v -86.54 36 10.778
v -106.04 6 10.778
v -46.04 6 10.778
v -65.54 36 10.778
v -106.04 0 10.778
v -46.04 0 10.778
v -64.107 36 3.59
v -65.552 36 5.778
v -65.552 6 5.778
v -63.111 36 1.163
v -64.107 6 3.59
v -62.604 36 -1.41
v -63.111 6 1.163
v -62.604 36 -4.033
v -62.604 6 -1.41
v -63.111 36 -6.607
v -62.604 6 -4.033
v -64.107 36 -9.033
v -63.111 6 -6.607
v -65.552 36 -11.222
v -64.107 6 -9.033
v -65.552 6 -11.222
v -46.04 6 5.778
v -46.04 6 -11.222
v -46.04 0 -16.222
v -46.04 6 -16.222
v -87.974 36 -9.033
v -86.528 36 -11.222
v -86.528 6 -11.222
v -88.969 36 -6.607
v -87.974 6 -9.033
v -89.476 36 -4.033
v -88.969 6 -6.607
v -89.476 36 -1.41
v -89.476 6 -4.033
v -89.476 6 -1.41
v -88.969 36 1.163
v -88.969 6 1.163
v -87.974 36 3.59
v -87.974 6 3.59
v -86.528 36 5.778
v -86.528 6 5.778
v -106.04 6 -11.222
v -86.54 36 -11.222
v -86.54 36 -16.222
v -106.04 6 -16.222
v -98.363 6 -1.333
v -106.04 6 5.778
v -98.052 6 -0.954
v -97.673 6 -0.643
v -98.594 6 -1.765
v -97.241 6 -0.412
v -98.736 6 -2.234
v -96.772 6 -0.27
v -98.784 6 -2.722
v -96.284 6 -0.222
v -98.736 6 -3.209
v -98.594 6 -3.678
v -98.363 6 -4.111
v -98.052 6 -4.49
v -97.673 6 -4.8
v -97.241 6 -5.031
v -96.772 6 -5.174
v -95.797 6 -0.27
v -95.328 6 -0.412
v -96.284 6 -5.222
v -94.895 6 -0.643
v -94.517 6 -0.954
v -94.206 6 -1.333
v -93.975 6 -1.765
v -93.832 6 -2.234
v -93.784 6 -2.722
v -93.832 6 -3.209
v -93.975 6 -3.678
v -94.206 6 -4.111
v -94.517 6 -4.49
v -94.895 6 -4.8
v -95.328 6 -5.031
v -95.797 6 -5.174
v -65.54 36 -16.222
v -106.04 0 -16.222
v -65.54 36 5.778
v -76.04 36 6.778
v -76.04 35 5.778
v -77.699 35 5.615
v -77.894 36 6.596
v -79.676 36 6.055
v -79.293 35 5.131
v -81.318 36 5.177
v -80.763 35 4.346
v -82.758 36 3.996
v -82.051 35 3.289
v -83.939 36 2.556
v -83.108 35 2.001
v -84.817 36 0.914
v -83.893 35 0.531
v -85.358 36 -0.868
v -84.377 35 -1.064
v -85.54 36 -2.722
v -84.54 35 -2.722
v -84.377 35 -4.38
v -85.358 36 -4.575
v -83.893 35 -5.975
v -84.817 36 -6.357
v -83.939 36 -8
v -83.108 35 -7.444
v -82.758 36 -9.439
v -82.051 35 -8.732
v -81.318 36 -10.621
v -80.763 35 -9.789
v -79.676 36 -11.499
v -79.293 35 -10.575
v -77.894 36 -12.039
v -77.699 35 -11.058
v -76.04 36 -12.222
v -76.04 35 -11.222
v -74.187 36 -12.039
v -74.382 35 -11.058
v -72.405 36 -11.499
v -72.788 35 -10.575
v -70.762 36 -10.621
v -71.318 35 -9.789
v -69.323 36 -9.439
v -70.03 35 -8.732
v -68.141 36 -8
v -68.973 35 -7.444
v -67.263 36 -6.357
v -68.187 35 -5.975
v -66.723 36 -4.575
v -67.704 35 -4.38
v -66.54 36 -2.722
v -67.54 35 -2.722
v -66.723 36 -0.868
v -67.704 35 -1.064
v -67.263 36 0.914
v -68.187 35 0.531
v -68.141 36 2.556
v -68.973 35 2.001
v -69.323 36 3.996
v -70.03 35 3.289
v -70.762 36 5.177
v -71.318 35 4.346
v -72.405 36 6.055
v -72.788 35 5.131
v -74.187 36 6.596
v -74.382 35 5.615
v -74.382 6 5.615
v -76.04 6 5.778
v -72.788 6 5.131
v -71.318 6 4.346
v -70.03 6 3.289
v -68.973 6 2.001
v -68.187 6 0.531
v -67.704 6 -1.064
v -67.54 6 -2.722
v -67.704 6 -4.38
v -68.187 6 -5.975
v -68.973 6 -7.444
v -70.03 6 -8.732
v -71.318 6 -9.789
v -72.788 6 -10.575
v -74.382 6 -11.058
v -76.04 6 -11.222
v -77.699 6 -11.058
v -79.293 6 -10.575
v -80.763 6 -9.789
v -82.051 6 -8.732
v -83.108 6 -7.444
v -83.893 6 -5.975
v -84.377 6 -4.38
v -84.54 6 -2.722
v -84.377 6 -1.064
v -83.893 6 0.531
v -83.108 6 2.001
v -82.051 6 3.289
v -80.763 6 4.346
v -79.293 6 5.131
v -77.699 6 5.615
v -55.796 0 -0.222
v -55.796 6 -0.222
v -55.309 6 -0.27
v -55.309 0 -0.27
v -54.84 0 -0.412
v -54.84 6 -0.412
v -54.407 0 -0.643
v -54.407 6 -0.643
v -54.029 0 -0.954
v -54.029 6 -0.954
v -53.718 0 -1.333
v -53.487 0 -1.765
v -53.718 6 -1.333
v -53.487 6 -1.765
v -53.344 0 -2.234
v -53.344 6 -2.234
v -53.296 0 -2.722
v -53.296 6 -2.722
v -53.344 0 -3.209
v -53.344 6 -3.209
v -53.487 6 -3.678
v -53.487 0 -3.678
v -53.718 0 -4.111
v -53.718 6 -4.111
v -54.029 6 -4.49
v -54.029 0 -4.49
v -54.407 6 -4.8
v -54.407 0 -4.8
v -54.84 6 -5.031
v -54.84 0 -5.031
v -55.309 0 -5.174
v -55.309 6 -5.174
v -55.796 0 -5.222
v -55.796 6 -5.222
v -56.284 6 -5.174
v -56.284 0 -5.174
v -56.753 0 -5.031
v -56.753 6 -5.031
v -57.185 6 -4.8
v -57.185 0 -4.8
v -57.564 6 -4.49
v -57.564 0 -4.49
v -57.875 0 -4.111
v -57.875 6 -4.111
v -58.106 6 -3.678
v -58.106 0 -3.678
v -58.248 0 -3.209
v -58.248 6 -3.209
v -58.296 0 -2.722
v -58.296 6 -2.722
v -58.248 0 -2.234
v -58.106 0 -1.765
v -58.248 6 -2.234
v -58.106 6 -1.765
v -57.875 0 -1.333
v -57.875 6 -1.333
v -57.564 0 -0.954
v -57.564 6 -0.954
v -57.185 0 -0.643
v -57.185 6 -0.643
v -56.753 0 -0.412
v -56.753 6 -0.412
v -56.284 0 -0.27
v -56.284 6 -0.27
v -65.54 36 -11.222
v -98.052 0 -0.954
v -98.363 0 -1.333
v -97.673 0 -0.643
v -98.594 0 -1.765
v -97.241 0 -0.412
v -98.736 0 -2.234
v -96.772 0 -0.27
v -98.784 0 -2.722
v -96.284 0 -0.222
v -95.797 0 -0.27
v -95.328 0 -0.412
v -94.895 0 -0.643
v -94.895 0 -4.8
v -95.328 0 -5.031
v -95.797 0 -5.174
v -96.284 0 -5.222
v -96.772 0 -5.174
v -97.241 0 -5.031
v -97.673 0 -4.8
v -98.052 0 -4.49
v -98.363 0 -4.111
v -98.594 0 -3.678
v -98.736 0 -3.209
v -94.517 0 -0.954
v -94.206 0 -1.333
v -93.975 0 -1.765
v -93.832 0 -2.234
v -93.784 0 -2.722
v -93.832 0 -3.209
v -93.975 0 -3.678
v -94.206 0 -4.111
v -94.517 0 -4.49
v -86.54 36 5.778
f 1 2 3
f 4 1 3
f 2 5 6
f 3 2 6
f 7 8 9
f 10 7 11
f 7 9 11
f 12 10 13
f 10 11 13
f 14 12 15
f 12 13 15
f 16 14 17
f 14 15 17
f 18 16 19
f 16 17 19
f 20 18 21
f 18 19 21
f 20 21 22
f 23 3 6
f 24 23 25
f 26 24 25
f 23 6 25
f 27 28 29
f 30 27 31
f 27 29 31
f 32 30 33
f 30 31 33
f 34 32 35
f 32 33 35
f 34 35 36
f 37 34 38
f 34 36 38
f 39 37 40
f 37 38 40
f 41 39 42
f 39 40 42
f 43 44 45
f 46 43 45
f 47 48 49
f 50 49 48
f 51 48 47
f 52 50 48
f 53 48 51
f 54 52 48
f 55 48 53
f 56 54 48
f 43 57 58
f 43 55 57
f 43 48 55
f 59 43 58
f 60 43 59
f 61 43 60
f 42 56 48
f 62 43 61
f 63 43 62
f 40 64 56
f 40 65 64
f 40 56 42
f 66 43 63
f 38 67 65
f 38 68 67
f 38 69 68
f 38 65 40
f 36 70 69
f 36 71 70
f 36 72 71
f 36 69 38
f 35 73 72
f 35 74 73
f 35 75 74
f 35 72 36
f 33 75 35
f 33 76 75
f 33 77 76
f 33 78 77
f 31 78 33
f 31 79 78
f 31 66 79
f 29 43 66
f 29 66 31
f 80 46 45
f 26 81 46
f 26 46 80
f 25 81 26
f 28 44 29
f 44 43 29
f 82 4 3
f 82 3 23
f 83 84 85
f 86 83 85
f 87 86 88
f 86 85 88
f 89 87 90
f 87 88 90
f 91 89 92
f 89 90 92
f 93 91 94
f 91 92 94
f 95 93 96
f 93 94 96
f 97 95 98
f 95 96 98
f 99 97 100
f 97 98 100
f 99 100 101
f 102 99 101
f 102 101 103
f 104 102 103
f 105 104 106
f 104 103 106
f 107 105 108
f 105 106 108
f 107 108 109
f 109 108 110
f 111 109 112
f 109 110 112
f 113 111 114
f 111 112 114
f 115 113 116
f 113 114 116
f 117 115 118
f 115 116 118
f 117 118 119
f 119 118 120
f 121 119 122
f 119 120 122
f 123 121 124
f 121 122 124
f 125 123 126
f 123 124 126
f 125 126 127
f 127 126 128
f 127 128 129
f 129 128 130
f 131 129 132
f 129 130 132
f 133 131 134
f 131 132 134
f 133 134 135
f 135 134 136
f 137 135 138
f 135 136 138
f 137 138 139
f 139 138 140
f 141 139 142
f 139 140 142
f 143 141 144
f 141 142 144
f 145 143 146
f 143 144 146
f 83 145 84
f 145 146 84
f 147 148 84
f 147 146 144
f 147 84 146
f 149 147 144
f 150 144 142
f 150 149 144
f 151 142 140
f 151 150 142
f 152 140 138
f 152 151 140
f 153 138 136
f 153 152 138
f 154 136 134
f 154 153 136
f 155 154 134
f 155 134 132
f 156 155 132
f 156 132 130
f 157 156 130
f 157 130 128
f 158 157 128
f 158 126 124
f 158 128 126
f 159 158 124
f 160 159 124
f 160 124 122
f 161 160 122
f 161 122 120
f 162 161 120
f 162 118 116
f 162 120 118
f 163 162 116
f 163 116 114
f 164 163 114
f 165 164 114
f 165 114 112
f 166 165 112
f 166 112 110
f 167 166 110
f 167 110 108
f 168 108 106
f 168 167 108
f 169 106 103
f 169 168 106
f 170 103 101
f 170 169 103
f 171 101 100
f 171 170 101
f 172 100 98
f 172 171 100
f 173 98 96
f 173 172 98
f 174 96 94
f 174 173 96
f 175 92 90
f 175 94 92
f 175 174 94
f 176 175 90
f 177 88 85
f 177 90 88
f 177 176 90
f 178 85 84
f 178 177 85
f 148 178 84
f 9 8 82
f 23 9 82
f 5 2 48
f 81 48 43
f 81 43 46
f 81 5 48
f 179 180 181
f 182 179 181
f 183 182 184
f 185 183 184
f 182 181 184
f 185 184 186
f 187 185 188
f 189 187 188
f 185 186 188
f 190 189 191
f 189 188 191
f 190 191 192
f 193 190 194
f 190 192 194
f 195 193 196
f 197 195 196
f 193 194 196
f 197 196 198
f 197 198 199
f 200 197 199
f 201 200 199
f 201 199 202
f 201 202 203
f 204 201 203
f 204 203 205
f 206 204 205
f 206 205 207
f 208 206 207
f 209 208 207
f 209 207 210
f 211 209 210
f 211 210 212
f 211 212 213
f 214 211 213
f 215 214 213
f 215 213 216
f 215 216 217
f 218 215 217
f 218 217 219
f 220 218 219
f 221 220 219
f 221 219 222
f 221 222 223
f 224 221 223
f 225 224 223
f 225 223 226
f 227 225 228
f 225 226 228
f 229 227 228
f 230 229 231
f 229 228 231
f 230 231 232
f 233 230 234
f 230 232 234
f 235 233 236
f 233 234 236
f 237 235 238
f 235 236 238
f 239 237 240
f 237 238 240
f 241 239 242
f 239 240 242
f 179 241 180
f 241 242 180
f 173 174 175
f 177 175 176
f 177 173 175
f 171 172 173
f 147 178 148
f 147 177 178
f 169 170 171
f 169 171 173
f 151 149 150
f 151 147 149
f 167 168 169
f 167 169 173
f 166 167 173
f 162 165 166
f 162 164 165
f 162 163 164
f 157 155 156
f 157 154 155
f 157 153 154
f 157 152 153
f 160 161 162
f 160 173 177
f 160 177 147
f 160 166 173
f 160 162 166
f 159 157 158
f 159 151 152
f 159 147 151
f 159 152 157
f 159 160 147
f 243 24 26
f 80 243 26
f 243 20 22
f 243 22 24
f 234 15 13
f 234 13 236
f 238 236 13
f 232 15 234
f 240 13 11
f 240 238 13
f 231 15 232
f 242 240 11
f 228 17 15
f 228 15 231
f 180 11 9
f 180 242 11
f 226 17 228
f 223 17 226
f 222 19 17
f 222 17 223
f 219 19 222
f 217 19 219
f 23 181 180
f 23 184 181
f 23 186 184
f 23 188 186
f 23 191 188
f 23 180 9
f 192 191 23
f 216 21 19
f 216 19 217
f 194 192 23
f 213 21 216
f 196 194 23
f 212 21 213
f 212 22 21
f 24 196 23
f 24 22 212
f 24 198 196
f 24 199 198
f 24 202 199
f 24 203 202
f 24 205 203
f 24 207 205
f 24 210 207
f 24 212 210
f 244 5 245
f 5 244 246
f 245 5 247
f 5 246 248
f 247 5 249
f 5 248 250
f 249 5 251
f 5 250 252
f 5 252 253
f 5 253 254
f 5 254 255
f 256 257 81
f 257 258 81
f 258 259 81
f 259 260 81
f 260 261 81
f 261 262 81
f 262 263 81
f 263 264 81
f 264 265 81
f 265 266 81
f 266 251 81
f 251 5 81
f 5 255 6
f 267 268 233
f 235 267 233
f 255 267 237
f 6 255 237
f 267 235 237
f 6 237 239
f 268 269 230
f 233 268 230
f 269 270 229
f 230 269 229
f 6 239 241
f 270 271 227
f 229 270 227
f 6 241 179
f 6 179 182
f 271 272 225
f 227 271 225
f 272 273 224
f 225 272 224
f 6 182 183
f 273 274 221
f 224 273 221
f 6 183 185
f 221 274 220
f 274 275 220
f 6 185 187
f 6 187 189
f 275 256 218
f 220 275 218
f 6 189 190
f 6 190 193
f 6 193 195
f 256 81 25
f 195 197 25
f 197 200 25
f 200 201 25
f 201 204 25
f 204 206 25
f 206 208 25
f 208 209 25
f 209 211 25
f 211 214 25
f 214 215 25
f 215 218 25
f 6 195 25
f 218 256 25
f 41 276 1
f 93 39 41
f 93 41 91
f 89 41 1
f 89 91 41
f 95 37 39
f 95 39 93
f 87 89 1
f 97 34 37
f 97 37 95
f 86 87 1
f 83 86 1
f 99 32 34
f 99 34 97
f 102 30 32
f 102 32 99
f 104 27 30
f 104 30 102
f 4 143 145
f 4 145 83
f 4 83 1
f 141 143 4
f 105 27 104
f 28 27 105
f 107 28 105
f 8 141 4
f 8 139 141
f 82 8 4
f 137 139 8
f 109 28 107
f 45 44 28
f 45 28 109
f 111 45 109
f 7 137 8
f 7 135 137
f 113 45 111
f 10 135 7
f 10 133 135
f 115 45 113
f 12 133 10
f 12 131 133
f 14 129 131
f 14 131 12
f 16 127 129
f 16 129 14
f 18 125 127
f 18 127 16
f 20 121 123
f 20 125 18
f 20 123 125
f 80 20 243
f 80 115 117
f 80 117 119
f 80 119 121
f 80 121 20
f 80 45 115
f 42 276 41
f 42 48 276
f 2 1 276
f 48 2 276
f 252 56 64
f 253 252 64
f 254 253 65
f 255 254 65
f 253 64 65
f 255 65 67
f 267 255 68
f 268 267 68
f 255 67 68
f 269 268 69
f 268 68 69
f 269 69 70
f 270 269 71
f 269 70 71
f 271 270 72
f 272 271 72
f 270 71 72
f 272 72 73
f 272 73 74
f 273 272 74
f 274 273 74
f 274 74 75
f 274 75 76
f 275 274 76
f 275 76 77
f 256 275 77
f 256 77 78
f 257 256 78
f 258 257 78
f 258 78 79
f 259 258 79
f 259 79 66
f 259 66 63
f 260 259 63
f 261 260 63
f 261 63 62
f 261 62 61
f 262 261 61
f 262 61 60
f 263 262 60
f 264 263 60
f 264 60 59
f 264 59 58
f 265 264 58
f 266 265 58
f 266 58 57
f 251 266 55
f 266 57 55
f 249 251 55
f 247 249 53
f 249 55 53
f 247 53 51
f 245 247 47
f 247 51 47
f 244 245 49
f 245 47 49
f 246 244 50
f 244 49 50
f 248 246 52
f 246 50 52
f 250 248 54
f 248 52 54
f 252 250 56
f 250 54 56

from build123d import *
from OCP.BRepFilletAPI import BRepFilletAPI_MakeChamfer

# Parameters (mm, degrees)
SKETCH1_W           = 60
SKETCH1_H           = 27
BOSS_EXTRUDE1_DEPTH = 6
SKETCH2_R           = 13.5
SKETCH2_R_2         = 8.5
BOSS_EXTRUDE2_DEPTH = 30
SKETCH3_W           = 60
SKETCH3_H           = 5
BOSS_EXTRUDE3_DEPTH = 30
CHAMFER1_SIZE       = 30
CHAMFER1_SIZE2      = 19.5
SKETCH5_R           = 2.5
CUT_EXTRUDE1_DEPTH  = 30
CHAMFER3_SIZE       = 1


with BuildPart() as part:
    # Sketch1 → Boss-Extrude1 (new body)
    with BuildSketch(Plane(origin=(0, 0, 0), x_dir=(1, 0, 0), z_dir=(0, 1, 0))):
        with Locations((-76.040322581, 2.721774194)):
            Rectangle(SKETCH1_W, SKETCH1_H)
    extrude(amount=BOSS_EXTRUDE1_DEPTH)

    # Sketch2 → Boss-Extrude2 (add)
    with BuildSketch(Plane(origin=(0, 6, 0), x_dir=(1, 0, 0), z_dir=(0, 1, 0))):
        with Locations(Location((-76.040322581, 2.721774194, 0), (0, 0, 270))):
            Circle(SKETCH2_R)
        with Locations(Location((-76.040322581, 2.721774194, 0), (0, 0, 270))):
            Circle(SKETCH2_R_2, mode=Mode.SUBTRACT)
    extrude(amount=BOSS_EXTRUDE2_DEPTH)

    # Sketch3 → Boss-Extrude3 (add)
    with BuildSketch(Plane(origin=(0, 6, 0), x_dir=(1, 0, 0), z_dir=(0, 1, 0))):
        with Locations((-76.040322581, 13.721774194)):
            Rectangle(SKETCH3_W, SKETCH3_H)
        with Locations((-76.040322581, -8.278225806)):
            Rectangle(SKETCH3_W, SKETCH3_H)
    extrude(amount=BOSS_EXTRUDE3_DEPTH)

    # Chamfer1: one chamfer whose edges measure the first distance from different faces: ONE call of the kernel's chamfer builder (chamfer() names one face for all edges)
    chamfer1_edges_1 = [part.edges().sort_by_distance(p)[0] for p in [
        (-46.040322581, 36, 8.278225806),
        (-46.040322581, 36, -13.721774194),
    ]]
    chamfer1_side_1 = [part.faces().sort_by_distance(p)[0] for p in [
        (-46.040322581, 18, -15.771774194),
    ]]
    chamfer1_edges_2 = [part.edges().sort_by_distance(p)[0] for p in [
        (-106.040322581, 36, 8.278225806),
        (-106.040322581, 36, -13.721774194),
    ]]
    chamfer1_side_2 = [part.faces().sort_by_distance(p)[0] for p in [
        (-106.040322581, 18, 10.328225806),
    ]]
    chamfer1 = BRepFilletAPI_MakeChamfer(part.part.solid().wrapped)
    for e in chamfer1_edges_1:
        chamfer1.Add(CHAMFER1_SIZE, CHAMFER1_SIZE2, e.wrapped, chamfer1_side_1[0].wrapped)  # the first distance lies on this face
    for e in chamfer1_edges_2:
        chamfer1.Add(CHAMFER1_SIZE, CHAMFER1_SIZE2, e.wrapped, chamfer1_side_2[0].wrapped)  # the first distance lies on this face
    add(Compound.cast(chamfer1.Shape()), mode=Mode.REPLACE)

    # Sketch5 → Cut-Extrude1 (cut)
    with BuildSketch(Plane(origin=(0, 6, 0), x_dir=(1, 0, 0), z_dir=(0, 1, 0))):
        with Locations(Location((-96.284366821, 2.721774194, 0), (0, 0, 270))):
            Circle(SKETCH5_R)
        with Locations(Location((-55.79627834, 2.721774194, 0), (0, 0, 270))):
            Circle(SKETCH5_R)
    extrude(amount=-CUT_EXTRUDE1_DEPTH, mode=Mode.SUBTRACT)

    # Chamfer3
    chamfer3_edges = [part.edges().sort_by_distance(p)[0] for p in [
        (-76.040322581, 36, -11.221774194),
    ]]
    chamfer(chamfer3_edges, length=CHAMFER3_SIZE)


solid = part.part
